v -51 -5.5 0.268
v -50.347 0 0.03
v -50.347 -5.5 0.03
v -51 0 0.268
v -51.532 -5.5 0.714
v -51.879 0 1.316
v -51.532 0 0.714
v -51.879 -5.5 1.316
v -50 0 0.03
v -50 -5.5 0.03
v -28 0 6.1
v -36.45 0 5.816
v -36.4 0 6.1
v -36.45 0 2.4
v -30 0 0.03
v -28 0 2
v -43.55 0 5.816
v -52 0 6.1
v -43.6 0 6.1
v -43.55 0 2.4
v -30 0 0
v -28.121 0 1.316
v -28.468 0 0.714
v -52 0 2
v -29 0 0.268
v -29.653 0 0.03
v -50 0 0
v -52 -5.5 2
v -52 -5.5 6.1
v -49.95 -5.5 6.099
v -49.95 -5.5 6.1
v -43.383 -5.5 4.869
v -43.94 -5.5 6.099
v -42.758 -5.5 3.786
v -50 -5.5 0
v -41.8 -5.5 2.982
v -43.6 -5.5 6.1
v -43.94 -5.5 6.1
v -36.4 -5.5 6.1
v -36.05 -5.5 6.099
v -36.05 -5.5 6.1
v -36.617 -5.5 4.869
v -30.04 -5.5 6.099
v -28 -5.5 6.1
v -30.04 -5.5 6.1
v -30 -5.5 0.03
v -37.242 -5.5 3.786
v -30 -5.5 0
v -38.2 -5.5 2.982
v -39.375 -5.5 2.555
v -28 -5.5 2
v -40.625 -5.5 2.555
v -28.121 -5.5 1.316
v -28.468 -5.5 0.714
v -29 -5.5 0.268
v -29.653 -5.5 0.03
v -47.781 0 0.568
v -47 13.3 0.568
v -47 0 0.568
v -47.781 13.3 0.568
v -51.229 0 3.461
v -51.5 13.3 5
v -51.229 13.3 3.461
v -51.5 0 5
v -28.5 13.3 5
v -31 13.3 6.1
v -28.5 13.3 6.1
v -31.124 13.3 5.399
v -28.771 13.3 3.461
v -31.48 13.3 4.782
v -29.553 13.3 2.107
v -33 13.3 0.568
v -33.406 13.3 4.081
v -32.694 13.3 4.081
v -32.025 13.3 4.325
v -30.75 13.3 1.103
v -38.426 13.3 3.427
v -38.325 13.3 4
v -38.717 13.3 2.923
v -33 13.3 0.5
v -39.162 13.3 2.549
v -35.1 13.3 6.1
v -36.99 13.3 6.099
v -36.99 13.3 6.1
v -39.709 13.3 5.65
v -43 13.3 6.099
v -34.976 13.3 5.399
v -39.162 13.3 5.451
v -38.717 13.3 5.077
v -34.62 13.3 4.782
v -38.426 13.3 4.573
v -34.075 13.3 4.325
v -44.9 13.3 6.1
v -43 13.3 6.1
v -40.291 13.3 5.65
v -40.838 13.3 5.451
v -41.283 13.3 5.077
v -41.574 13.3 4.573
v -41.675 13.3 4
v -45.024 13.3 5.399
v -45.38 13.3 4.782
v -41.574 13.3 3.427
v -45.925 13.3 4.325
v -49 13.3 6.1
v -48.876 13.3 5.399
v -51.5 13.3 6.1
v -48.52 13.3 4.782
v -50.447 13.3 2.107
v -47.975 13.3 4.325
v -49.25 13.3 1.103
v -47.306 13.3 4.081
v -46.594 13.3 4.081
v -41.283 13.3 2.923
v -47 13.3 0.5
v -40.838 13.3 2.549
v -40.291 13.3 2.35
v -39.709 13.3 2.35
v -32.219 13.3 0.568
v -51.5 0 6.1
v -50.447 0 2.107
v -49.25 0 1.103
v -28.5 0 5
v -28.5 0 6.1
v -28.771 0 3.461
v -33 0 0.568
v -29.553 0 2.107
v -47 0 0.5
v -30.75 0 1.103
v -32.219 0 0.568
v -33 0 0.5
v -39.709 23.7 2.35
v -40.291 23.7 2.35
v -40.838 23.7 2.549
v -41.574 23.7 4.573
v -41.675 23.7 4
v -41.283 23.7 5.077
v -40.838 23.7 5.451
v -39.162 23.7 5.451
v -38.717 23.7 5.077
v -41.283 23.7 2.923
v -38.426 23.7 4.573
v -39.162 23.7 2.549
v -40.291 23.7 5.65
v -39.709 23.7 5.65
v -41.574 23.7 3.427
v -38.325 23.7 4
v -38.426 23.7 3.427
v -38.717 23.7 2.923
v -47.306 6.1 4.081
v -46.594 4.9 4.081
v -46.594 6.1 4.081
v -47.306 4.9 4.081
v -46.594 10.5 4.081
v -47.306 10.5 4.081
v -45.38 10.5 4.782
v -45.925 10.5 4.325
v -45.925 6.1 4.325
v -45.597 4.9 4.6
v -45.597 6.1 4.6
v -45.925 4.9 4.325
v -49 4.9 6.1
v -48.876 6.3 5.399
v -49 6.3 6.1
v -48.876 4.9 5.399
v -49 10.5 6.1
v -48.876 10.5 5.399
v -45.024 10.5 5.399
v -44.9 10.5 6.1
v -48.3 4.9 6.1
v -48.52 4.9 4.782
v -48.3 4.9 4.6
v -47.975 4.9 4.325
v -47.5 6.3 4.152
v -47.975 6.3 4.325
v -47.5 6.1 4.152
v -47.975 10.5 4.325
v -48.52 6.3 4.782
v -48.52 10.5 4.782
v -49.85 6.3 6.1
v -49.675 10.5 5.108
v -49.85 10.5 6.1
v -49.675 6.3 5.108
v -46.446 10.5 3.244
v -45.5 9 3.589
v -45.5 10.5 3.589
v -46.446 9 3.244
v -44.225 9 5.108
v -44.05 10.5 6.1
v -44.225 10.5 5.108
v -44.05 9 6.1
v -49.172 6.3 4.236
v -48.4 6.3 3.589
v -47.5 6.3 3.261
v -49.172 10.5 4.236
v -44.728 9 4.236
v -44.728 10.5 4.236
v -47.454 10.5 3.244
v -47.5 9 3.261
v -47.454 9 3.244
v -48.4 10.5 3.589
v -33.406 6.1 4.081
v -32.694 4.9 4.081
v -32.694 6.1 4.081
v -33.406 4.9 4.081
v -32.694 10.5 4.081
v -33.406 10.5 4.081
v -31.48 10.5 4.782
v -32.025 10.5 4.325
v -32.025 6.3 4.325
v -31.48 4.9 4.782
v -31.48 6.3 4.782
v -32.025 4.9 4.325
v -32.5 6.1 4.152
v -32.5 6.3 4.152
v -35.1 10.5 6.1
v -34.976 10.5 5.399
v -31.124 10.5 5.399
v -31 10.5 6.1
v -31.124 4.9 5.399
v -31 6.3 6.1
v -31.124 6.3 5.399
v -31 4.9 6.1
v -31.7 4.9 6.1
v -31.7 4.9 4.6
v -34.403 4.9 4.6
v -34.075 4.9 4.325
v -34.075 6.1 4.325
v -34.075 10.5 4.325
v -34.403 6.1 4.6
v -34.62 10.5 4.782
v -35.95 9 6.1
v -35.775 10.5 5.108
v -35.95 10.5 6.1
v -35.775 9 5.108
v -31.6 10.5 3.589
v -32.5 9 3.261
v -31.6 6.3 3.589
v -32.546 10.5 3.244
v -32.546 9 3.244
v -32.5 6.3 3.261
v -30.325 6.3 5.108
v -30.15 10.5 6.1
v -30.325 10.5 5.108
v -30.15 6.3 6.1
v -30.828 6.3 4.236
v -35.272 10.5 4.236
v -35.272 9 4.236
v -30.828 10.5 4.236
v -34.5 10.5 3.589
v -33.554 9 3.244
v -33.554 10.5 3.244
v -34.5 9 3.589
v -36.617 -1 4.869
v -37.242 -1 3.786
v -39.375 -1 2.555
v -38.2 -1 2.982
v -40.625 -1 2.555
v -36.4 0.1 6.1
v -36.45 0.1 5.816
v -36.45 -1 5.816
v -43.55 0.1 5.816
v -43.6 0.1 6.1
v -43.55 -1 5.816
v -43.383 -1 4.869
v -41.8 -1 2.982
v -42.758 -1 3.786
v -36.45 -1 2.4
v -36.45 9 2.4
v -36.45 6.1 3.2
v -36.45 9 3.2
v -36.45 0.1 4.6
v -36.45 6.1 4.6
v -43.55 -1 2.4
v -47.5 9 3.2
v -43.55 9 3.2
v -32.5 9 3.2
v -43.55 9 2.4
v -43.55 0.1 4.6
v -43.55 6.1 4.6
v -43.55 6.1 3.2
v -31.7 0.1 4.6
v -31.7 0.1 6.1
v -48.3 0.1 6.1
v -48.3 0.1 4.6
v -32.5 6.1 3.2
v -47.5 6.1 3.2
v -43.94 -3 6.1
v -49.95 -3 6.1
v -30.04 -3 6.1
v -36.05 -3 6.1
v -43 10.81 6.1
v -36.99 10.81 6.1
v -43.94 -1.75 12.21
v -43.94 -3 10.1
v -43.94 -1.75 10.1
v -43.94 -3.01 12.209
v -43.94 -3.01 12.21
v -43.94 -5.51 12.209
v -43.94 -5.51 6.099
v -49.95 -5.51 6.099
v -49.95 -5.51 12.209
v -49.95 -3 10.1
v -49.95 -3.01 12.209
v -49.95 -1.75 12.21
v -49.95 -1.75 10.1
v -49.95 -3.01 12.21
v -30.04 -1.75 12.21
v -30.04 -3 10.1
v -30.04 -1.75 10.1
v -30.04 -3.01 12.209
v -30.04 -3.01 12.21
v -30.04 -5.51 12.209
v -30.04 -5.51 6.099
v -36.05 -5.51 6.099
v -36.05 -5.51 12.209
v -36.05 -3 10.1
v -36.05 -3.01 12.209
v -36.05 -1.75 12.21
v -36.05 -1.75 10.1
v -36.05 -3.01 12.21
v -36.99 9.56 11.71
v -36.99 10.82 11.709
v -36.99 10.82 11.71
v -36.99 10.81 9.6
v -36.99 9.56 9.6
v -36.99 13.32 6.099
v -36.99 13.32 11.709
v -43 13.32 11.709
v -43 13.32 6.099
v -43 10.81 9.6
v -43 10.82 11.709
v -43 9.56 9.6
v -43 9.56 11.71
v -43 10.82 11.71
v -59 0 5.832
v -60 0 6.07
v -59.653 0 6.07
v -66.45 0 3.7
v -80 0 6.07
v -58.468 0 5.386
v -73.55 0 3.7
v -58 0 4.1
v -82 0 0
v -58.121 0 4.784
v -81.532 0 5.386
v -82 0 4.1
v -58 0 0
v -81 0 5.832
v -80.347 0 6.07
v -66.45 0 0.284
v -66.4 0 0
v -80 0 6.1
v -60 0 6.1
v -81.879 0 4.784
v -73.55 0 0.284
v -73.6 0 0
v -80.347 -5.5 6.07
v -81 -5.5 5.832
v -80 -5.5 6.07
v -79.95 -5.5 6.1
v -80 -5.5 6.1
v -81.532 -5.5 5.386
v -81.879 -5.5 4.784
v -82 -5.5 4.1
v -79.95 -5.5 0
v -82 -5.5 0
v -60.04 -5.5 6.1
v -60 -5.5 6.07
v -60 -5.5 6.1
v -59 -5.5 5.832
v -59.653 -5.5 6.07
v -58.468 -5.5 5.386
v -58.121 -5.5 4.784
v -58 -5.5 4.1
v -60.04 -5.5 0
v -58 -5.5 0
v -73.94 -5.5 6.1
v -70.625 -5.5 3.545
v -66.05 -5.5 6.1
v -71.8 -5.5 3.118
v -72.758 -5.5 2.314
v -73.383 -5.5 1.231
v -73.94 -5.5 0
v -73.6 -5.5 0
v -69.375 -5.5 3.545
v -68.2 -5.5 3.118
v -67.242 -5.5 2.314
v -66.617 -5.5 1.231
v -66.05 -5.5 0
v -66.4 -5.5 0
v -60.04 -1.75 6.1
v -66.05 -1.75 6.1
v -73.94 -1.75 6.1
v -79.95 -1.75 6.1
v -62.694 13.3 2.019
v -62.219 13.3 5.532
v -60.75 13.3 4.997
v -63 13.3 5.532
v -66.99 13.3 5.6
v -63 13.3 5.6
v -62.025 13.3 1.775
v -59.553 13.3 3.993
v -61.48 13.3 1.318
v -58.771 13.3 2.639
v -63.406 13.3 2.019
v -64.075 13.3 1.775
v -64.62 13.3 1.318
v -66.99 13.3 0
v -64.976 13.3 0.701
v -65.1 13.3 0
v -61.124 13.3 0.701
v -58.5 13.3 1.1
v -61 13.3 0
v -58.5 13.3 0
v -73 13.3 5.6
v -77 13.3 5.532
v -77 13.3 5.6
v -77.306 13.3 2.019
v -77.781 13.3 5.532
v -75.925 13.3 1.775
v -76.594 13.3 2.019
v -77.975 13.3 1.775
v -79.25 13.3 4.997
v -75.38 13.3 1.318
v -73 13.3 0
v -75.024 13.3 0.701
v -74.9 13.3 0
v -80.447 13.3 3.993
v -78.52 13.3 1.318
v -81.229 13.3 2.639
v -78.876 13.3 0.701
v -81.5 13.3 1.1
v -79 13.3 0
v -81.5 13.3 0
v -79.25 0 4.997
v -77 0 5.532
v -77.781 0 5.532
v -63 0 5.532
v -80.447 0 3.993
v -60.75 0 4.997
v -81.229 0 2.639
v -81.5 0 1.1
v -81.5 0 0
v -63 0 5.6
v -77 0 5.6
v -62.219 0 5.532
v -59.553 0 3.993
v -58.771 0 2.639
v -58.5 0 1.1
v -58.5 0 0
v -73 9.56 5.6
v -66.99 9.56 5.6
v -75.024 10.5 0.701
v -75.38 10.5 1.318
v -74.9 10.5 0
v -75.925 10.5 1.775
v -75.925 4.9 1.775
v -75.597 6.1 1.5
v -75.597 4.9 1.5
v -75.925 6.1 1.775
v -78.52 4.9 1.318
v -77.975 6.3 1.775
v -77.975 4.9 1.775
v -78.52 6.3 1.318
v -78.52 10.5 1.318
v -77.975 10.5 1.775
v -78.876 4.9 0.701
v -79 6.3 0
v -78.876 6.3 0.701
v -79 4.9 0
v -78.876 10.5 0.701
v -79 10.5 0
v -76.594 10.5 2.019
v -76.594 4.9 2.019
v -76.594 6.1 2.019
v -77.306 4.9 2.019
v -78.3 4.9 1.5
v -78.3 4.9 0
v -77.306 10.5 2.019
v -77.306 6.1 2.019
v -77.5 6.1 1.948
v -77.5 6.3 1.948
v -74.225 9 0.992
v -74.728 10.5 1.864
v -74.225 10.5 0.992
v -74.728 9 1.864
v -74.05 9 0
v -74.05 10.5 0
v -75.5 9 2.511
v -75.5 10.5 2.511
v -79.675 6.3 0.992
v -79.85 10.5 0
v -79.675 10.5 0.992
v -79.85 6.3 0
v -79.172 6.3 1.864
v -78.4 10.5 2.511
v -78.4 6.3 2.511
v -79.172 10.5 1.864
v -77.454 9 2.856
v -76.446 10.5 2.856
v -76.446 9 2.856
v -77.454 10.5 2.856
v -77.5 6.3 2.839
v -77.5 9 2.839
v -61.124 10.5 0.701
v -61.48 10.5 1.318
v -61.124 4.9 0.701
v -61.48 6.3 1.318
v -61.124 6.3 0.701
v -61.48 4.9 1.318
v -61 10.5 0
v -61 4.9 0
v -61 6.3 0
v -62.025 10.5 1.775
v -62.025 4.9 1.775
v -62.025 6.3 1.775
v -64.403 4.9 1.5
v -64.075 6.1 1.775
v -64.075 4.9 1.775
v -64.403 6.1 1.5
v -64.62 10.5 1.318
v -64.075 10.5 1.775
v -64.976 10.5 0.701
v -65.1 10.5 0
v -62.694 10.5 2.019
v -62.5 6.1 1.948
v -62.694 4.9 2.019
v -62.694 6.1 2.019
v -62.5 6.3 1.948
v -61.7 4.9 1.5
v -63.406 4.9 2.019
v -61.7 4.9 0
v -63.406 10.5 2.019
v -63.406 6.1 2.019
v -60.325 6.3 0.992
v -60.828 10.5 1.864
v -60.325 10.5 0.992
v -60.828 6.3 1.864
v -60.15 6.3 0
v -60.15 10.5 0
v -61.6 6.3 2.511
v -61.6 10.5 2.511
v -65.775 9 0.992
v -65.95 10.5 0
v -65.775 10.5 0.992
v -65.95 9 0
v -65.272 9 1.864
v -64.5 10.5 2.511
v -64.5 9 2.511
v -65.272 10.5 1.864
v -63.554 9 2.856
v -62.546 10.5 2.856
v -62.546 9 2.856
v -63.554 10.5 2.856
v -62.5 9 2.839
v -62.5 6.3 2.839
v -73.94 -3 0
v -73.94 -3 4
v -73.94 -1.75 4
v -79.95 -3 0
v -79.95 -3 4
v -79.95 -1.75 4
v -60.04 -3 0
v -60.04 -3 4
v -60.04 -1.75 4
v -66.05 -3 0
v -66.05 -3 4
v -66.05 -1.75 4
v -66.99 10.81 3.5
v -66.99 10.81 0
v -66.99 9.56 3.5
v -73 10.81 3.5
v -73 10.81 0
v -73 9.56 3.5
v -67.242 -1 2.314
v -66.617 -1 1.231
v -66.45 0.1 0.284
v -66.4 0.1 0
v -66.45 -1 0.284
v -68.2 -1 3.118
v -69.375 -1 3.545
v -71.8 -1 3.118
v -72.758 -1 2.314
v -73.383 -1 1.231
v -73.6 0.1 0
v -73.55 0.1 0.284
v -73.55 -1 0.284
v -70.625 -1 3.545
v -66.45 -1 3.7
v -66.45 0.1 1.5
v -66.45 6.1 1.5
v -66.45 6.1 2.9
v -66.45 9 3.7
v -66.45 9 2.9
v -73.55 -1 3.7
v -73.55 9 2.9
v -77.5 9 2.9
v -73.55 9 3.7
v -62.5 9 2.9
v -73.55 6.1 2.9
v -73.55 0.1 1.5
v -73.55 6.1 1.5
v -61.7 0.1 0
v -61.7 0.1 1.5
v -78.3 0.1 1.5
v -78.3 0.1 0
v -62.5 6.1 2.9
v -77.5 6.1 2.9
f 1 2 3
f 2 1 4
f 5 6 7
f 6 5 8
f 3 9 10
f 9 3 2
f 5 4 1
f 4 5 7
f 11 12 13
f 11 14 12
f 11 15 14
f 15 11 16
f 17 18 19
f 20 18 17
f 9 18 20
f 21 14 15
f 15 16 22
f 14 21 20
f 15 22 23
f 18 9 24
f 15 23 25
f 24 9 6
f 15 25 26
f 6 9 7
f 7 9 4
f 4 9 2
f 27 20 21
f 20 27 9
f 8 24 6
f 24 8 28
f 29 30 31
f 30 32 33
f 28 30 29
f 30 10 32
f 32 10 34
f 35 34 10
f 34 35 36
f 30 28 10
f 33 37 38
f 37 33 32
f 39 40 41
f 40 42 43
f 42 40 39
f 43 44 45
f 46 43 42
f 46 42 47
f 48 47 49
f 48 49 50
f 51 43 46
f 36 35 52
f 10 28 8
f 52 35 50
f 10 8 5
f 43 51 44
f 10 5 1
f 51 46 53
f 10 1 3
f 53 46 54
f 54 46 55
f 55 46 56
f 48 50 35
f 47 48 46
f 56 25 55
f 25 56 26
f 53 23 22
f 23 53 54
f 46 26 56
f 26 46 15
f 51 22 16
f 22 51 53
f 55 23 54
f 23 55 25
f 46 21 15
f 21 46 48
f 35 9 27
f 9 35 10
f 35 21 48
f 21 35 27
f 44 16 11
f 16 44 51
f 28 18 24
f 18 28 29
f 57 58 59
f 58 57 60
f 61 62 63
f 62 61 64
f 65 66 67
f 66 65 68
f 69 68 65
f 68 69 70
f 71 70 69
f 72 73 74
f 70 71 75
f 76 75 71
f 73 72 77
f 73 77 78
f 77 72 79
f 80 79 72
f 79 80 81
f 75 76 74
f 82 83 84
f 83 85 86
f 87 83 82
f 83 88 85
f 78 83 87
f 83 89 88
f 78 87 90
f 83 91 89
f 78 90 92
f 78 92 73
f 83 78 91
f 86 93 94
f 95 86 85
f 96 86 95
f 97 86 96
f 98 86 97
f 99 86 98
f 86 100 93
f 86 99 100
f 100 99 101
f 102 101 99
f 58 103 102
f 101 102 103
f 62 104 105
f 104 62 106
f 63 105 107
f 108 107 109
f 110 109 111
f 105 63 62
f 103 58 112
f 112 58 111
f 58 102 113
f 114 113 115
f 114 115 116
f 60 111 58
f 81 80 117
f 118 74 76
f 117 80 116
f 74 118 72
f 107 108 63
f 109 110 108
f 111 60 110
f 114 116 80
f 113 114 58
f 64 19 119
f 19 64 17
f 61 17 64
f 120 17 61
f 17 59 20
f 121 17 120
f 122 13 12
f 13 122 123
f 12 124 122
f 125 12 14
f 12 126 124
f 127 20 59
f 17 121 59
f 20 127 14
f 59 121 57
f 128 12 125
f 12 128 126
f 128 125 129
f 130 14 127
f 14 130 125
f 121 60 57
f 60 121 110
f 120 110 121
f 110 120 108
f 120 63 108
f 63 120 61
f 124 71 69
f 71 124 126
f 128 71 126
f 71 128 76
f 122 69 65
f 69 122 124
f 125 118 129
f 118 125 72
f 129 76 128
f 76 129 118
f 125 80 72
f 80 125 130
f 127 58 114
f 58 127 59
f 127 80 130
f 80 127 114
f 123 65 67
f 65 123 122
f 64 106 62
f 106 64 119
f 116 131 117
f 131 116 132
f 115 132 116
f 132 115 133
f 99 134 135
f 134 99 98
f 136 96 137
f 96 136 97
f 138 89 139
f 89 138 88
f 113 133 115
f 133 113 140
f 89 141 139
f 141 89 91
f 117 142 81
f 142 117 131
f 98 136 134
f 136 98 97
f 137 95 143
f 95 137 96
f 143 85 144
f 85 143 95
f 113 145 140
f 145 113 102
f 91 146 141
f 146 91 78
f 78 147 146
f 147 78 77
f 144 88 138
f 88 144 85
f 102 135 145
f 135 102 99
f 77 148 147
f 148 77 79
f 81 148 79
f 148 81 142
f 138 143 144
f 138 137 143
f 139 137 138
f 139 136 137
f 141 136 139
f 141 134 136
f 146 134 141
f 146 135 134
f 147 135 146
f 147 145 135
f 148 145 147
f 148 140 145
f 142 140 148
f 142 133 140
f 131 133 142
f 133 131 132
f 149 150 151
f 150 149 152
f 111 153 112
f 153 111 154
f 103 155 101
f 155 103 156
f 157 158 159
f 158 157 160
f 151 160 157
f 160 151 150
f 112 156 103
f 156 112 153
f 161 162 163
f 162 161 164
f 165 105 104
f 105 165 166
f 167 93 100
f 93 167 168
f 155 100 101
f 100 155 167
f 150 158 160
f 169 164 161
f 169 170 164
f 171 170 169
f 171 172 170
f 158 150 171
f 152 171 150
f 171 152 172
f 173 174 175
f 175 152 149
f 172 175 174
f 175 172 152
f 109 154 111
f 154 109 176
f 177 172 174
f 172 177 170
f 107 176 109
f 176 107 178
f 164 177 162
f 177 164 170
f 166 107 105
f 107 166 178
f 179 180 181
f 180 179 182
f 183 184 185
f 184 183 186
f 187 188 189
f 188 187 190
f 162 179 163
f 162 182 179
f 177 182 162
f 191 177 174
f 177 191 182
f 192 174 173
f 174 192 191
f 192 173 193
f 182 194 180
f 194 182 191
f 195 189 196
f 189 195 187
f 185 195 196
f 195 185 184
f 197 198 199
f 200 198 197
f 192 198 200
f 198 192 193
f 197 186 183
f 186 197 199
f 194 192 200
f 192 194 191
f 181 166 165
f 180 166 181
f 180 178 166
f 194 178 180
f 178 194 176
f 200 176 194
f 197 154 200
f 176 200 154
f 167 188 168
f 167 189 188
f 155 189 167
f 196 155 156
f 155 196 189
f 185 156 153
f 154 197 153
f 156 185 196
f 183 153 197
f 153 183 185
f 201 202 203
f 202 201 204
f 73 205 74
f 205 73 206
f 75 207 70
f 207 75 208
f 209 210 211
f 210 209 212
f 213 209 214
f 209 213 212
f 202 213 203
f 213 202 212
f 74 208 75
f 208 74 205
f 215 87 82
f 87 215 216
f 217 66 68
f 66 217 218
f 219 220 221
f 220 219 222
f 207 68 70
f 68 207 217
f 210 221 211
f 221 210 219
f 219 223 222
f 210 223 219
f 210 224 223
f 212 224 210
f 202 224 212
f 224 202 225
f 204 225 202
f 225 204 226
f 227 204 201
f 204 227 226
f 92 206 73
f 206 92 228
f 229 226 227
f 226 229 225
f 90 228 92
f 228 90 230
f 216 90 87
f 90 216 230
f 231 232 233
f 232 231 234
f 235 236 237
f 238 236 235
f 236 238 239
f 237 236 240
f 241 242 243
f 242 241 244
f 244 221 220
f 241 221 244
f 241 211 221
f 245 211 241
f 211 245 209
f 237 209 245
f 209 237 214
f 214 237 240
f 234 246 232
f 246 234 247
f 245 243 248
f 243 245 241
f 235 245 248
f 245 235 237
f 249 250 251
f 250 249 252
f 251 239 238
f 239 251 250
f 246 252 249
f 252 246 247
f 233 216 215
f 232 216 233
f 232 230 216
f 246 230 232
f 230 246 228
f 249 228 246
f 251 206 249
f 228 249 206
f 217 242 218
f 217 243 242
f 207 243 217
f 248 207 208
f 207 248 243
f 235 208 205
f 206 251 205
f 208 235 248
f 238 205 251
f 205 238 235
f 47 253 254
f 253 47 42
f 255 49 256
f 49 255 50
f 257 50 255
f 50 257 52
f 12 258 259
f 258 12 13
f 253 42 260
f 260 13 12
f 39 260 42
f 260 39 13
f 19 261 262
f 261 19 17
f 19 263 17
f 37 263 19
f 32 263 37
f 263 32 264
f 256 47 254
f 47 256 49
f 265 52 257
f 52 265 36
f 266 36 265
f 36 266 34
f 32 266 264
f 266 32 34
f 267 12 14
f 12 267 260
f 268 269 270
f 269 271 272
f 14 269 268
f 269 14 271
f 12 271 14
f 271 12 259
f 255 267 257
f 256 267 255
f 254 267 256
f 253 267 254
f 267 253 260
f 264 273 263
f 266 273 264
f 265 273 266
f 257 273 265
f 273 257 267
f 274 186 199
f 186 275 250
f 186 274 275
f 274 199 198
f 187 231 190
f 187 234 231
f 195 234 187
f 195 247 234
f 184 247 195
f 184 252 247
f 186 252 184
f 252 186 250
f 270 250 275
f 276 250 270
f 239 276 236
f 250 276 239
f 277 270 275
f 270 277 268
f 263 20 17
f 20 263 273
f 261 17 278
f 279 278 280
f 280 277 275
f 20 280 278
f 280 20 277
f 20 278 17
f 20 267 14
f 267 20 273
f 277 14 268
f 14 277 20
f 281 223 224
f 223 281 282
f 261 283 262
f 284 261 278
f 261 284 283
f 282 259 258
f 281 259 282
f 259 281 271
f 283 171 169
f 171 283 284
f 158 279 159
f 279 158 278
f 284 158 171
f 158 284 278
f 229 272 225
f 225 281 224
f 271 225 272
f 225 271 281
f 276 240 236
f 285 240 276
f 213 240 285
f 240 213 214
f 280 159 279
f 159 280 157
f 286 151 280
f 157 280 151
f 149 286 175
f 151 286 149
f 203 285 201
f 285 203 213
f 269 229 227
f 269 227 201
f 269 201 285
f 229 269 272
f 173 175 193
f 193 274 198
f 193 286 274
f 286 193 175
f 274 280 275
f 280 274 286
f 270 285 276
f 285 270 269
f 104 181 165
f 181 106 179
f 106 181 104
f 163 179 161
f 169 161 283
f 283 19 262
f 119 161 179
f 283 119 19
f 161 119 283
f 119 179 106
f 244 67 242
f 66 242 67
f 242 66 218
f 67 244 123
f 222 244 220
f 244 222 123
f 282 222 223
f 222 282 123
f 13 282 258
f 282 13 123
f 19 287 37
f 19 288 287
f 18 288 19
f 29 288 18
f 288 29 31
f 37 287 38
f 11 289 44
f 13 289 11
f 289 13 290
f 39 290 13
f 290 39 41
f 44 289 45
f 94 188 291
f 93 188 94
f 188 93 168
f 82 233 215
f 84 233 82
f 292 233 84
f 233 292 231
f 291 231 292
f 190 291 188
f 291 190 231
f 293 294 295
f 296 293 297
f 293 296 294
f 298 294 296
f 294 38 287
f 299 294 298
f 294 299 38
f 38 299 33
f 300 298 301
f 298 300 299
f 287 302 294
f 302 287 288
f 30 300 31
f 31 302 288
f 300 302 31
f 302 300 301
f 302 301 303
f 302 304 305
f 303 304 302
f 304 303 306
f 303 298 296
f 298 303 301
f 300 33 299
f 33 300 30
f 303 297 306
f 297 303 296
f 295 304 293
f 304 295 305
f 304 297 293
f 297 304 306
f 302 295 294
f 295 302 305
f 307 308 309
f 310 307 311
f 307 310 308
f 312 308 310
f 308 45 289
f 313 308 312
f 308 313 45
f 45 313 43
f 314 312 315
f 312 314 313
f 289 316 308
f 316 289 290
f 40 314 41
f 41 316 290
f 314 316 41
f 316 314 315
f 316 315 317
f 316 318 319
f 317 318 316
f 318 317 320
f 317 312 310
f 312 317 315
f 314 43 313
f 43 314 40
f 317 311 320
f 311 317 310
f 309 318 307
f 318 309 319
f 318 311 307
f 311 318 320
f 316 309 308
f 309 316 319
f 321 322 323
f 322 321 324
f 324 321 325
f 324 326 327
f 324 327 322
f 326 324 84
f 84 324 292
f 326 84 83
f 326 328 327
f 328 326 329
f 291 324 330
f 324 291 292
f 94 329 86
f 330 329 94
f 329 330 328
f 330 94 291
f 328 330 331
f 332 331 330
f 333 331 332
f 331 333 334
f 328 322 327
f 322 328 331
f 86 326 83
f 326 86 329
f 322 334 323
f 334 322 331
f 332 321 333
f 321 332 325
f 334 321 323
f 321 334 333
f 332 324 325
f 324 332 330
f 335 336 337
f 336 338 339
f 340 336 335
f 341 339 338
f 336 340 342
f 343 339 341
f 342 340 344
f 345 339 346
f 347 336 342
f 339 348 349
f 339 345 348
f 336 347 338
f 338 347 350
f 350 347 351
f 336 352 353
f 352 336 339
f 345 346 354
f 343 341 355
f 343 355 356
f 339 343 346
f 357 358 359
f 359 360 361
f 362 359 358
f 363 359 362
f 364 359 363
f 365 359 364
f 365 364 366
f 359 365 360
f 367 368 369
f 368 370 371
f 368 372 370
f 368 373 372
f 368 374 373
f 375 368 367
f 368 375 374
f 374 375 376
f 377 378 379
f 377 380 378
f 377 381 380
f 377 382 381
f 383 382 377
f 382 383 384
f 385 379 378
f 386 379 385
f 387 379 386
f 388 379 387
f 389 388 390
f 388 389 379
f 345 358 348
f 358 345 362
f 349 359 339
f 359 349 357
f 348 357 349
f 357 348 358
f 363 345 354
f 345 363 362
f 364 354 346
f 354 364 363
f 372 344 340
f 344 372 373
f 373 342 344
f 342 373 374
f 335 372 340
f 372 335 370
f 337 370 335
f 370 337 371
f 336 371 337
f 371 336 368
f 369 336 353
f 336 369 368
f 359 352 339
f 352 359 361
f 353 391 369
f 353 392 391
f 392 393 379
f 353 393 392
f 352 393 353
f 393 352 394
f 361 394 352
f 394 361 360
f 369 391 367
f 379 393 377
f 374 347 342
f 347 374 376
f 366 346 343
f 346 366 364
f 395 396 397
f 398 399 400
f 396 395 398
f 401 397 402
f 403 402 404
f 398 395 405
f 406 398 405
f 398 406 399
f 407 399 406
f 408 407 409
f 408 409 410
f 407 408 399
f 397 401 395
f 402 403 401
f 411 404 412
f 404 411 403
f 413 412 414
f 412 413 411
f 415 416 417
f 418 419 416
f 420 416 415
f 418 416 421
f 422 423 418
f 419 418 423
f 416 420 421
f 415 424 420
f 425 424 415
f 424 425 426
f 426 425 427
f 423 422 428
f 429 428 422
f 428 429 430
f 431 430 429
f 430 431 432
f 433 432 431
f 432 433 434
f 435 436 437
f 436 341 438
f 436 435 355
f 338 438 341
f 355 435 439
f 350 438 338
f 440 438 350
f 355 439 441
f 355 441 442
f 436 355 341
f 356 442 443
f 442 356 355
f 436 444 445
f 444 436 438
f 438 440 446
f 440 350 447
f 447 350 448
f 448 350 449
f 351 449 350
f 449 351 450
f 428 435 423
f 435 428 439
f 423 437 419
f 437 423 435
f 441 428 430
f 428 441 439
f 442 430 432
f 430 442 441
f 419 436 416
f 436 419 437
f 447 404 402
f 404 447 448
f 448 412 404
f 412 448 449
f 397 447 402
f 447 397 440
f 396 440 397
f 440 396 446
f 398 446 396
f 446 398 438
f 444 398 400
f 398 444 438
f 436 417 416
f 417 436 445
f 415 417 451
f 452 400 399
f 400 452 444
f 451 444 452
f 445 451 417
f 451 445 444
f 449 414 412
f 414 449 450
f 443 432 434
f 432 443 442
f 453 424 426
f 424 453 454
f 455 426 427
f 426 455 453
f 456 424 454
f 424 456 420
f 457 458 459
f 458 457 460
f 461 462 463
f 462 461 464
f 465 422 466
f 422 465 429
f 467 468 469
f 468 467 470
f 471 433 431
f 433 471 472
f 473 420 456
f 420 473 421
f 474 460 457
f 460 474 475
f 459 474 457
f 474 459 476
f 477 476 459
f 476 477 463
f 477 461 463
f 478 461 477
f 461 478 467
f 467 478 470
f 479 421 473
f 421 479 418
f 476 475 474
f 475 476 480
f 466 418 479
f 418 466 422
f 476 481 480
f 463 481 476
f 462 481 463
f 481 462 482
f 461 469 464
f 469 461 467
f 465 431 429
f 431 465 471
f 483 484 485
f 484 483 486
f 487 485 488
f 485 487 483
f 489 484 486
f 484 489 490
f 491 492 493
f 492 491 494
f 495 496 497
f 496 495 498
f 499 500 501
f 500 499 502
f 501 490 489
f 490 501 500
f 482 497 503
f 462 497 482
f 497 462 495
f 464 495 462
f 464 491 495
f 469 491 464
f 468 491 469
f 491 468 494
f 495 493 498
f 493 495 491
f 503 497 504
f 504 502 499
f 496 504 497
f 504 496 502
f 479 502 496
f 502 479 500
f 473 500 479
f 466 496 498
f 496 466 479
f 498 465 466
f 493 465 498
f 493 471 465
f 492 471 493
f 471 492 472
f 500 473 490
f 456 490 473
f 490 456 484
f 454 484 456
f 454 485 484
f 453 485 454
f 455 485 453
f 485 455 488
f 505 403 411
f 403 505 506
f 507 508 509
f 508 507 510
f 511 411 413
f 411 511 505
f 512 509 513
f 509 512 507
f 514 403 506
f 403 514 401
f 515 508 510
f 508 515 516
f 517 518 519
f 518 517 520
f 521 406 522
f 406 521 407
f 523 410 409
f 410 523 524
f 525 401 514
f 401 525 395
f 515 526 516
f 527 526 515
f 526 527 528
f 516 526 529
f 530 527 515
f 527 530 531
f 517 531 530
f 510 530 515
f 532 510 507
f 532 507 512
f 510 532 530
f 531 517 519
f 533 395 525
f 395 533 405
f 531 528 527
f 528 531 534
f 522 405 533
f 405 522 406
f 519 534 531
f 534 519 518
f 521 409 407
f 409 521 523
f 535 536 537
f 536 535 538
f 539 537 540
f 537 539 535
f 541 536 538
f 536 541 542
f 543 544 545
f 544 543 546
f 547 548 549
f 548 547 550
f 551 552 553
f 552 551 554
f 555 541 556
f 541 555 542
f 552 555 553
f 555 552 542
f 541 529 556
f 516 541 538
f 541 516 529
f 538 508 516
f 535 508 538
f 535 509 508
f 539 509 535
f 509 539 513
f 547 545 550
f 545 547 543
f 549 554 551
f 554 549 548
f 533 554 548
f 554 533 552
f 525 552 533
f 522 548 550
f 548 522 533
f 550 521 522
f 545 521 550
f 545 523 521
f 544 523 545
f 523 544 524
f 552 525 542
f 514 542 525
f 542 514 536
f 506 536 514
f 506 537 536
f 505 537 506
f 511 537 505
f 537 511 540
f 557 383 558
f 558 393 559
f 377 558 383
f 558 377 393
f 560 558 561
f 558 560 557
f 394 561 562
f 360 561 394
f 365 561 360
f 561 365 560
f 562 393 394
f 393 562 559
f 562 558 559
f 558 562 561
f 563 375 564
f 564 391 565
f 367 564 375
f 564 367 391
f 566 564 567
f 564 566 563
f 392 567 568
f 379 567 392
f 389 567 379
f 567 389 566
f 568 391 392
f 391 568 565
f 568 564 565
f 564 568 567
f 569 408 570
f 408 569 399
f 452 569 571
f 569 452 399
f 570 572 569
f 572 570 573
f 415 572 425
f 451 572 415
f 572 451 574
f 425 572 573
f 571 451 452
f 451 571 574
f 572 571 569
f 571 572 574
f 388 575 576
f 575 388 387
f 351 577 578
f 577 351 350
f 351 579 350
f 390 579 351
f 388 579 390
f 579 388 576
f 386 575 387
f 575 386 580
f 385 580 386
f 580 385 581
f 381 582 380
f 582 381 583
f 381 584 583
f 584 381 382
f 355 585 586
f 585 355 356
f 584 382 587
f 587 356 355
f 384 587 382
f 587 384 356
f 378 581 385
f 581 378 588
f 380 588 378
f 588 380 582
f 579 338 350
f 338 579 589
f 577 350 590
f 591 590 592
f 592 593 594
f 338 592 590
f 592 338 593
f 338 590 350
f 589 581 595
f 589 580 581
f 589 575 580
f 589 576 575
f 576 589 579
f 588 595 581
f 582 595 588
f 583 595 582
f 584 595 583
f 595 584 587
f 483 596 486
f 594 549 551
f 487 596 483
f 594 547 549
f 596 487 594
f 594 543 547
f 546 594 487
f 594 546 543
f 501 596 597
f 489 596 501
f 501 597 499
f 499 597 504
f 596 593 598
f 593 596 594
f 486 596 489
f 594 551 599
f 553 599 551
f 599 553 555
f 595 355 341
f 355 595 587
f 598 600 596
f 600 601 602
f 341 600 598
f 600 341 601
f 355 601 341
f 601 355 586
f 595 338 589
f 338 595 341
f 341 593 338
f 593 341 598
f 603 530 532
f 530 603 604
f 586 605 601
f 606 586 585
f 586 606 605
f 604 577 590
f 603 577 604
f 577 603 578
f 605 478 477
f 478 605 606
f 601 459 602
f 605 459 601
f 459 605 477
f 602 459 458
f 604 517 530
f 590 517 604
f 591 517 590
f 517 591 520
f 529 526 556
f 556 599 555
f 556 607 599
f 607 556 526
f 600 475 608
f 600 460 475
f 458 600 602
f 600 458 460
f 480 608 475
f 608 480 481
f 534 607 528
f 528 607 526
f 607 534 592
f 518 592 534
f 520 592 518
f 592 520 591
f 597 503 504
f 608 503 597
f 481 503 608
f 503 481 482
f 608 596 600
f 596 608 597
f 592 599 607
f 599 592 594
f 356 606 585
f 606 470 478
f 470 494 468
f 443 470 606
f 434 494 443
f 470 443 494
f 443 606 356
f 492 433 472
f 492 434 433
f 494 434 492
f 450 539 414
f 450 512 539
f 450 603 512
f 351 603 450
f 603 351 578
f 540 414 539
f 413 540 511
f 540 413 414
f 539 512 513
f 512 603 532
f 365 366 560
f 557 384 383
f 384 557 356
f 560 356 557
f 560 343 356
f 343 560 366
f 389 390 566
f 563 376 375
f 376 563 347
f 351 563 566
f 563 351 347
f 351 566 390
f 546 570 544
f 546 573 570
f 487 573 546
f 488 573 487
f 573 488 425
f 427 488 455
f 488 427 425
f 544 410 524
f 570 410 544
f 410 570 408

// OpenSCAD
// Stecker fuer Wohnmobil

use <MCAD/boxes.scad>;

// Hinterer Teil (Griff)
backOuterSize=[24,12.2,5.5];

// Vorderer Teil
frontOuterSize=[23,11.2,13.3];

wandStarke=4;
buchseOuterSide=[24,12.2,13.3+10.4] + wandStarke*[1,1,1];

lochHintenDurchmesser=7.2;
lochHintenLaenge=14.1;

lochVorneDurchmesser=4.1;
//lochVorneDistanz=14.3;
lochVorneDistanz=9.8+lochVorneDurchmesser;
lochVorneHoehe=8.4;

zapfenLaenge=10.4;
zapfenDurchmesser=3.35;
zapfenOffset=[0,-2.1,0];

arretierLasche=[6,backOuterSize[1]/2,2.5];

$fn=18;
debugShow=0;

// ---------------------- Examples ----------------------

if (debugShow){
    translate([0,0,0]) Stecker();
    translate([50,0,0]) SteckerHaelfte(side=0);
    translate([100,0,0]) SteckerHaelfte(side=1);
    translate([0,50,0]) Buchse(side=1);
}

translate([-40,0,backOuterSize[1]/2])  rotate([90,0,0]) SteckerHaelfte(side=0);
translate([-70,0,0]) rotate([90,0,0]) SteckerHaelfte(side=1);


// ---------------------- Main ----------------------

module Buchse(){
    difference(){
        translate([-buchseOuterSide[0]/2,-buchseOuterSide[1]/2,-buchseOuterSide[2]])
            cube(buchseOuterSide);
        Stecker();
        }
}
module Stecker(zapfen=1){
    radiusHinten=2;
    radiusVorne=4.5;
    difference(){
            union(){
                // Hinterer Teil
                translate([0,0,backOuterSize[2]/2]) 
                        roundedBox(backOuterSize,radiusHinten,true);

                // Vorderer Teil
                translate([0,0,-frontOuterSize[2]/2]) 
                       roundedBox(frontOuterSize, radiusVorne, true);

                // Zapfen vorne
                if(zapfen)
                        translate([0,0,-frontOuterSize[2]])
                            translate(zapfenOffset)
                            rotate([0,180,0])
                                cylinder(d=zapfenDurchmesser,h=zapfenLaenge);

            }

            // Loch hinten
//            translate([0,0,backOuterSide[2]-lochHintenLaenge]) 
            translate([0,0,backOuterSize[2]-lochHintenLaenge]) 
                    cylinder(d=lochHintenDurchmesser,h=lochHintenLaenge+.01);

            verkabelungsAussparung1=[7.1,3.7*2,10];
            verkabelungsAussparung1Offset=[9,3,13];
            translate([0,0,verkabelungsAussparung1[2]/2] 
                      -[0,0,frontOuterSize[2]]
                      +[0,0,4.3]) 
                    cube(verkabelungsAussparung1,center=true);

            verkabelungsAussparung2=[16.6,2*1.5,8.9];
            verkabelungsAussparung2Offset=[9,3,13];
            translate([0,0,verkabelungsAussparung2[2]/2] 
                      -[0,0,frontOuterSize[2]]
                      +[0,0,4.3]) 
            cube(verkabelungsAussparung2,center=true);

            verkabelungsAussparung3=[15.0,2.9*2,2.9];
            verkabelungsAussparung3Offset=[9,3,13];
            translate([0,0,verkabelungsAussparung3[2]/2] 
                      -[0,0,frontOuterSize[2]]
                      +[0,0,4.3]) 
            cube(verkabelungsAussparung3,center=true);

            // Löcher vorne
            for (x=[-lochVorneDistanz/2,lochVorneDistanz/2]){
                translate([x,0,-frontOuterSize[2]-.1]) 
                    SteckerAussparung();                                        
            }
    }
}

module SteckerAussparung(){
        cylinder(d=lochVorneDurchmesser,h=lochVorneHoehe+.1);

//        cylinder(d=lochVorneDurchmesser+2*wulstDicke,h=wulstHoehe);
//2.8 
        wulstDurchmesser=2*2.9;
        wulstHoehe=4.2;
        wulstDistanz=2.9;
        translate([0,0,wulstDistanz])
            cylinder(d=wulstDurchmesser,h=wulstHoehe);
}

module SteckerHaelfte(side=0){
    zapfen= side==1?0:1;
    
    difference(){
        Stecker(zapfen=zapfen);

        // Haelfte freischneiden
        {
            cutX=backOuterSize[0] +.1;
            cutY=backOuterSize[1]/2 +.1;
            cutZ=frontOuterSize[2]+backOuterSize[2] +.1;
            cutZd=-frontOuterSize[2]-.01;
            translate([-cutX/2,-side*cutY,cutZd])
                cube([cutX,cutY,cutZ+.02]);
        }
        
        if(side){
            ArretierLaschen();            
        }
    }
    if(!side)
        ArretierLaschen();
}


module ArretierLaschen(){
    arretierLascheY=arretierLasche[1];
    arretierLascheZ=arretierLasche[2];
    for (x=[-lochVorneDistanz/2,lochVorneDistanz/2]){
        translate([x,0,backOuterSize[2]-arretierLascheZ])
            ArretierLasche();
    }
    
    translate([0,0,-frontOuterSize[2]-.01+arretierLasche[2]])
        mirror([0,0,1])
            ArretierLasche(laenge=frontOuterSize[1]/2);
 
}

module ArretierLasche(laenge=arretierLasche[1]){
    miniZusatz=(0.01*[1,1,1]);
    arretierLasche1=[arretierLasche[0],laenge,arretierLasche[2]];
        translate([-arretierLasche1[0]/2,-.001,0])
            cube(arretierLasche1 + miniZusatz);

    arretierLasche2Y=2.1;
    arretierLasche2=[arretierLasche1[0],arretierLasche2Y,arretierLasche1[2]/2];
    translate([-arretierLasche1[0]/2,arretierLasche1[1]-arretierLasche2[1],-arretierLasche2[2]])
        cube(arretierLasche2+miniZusatz);
}
